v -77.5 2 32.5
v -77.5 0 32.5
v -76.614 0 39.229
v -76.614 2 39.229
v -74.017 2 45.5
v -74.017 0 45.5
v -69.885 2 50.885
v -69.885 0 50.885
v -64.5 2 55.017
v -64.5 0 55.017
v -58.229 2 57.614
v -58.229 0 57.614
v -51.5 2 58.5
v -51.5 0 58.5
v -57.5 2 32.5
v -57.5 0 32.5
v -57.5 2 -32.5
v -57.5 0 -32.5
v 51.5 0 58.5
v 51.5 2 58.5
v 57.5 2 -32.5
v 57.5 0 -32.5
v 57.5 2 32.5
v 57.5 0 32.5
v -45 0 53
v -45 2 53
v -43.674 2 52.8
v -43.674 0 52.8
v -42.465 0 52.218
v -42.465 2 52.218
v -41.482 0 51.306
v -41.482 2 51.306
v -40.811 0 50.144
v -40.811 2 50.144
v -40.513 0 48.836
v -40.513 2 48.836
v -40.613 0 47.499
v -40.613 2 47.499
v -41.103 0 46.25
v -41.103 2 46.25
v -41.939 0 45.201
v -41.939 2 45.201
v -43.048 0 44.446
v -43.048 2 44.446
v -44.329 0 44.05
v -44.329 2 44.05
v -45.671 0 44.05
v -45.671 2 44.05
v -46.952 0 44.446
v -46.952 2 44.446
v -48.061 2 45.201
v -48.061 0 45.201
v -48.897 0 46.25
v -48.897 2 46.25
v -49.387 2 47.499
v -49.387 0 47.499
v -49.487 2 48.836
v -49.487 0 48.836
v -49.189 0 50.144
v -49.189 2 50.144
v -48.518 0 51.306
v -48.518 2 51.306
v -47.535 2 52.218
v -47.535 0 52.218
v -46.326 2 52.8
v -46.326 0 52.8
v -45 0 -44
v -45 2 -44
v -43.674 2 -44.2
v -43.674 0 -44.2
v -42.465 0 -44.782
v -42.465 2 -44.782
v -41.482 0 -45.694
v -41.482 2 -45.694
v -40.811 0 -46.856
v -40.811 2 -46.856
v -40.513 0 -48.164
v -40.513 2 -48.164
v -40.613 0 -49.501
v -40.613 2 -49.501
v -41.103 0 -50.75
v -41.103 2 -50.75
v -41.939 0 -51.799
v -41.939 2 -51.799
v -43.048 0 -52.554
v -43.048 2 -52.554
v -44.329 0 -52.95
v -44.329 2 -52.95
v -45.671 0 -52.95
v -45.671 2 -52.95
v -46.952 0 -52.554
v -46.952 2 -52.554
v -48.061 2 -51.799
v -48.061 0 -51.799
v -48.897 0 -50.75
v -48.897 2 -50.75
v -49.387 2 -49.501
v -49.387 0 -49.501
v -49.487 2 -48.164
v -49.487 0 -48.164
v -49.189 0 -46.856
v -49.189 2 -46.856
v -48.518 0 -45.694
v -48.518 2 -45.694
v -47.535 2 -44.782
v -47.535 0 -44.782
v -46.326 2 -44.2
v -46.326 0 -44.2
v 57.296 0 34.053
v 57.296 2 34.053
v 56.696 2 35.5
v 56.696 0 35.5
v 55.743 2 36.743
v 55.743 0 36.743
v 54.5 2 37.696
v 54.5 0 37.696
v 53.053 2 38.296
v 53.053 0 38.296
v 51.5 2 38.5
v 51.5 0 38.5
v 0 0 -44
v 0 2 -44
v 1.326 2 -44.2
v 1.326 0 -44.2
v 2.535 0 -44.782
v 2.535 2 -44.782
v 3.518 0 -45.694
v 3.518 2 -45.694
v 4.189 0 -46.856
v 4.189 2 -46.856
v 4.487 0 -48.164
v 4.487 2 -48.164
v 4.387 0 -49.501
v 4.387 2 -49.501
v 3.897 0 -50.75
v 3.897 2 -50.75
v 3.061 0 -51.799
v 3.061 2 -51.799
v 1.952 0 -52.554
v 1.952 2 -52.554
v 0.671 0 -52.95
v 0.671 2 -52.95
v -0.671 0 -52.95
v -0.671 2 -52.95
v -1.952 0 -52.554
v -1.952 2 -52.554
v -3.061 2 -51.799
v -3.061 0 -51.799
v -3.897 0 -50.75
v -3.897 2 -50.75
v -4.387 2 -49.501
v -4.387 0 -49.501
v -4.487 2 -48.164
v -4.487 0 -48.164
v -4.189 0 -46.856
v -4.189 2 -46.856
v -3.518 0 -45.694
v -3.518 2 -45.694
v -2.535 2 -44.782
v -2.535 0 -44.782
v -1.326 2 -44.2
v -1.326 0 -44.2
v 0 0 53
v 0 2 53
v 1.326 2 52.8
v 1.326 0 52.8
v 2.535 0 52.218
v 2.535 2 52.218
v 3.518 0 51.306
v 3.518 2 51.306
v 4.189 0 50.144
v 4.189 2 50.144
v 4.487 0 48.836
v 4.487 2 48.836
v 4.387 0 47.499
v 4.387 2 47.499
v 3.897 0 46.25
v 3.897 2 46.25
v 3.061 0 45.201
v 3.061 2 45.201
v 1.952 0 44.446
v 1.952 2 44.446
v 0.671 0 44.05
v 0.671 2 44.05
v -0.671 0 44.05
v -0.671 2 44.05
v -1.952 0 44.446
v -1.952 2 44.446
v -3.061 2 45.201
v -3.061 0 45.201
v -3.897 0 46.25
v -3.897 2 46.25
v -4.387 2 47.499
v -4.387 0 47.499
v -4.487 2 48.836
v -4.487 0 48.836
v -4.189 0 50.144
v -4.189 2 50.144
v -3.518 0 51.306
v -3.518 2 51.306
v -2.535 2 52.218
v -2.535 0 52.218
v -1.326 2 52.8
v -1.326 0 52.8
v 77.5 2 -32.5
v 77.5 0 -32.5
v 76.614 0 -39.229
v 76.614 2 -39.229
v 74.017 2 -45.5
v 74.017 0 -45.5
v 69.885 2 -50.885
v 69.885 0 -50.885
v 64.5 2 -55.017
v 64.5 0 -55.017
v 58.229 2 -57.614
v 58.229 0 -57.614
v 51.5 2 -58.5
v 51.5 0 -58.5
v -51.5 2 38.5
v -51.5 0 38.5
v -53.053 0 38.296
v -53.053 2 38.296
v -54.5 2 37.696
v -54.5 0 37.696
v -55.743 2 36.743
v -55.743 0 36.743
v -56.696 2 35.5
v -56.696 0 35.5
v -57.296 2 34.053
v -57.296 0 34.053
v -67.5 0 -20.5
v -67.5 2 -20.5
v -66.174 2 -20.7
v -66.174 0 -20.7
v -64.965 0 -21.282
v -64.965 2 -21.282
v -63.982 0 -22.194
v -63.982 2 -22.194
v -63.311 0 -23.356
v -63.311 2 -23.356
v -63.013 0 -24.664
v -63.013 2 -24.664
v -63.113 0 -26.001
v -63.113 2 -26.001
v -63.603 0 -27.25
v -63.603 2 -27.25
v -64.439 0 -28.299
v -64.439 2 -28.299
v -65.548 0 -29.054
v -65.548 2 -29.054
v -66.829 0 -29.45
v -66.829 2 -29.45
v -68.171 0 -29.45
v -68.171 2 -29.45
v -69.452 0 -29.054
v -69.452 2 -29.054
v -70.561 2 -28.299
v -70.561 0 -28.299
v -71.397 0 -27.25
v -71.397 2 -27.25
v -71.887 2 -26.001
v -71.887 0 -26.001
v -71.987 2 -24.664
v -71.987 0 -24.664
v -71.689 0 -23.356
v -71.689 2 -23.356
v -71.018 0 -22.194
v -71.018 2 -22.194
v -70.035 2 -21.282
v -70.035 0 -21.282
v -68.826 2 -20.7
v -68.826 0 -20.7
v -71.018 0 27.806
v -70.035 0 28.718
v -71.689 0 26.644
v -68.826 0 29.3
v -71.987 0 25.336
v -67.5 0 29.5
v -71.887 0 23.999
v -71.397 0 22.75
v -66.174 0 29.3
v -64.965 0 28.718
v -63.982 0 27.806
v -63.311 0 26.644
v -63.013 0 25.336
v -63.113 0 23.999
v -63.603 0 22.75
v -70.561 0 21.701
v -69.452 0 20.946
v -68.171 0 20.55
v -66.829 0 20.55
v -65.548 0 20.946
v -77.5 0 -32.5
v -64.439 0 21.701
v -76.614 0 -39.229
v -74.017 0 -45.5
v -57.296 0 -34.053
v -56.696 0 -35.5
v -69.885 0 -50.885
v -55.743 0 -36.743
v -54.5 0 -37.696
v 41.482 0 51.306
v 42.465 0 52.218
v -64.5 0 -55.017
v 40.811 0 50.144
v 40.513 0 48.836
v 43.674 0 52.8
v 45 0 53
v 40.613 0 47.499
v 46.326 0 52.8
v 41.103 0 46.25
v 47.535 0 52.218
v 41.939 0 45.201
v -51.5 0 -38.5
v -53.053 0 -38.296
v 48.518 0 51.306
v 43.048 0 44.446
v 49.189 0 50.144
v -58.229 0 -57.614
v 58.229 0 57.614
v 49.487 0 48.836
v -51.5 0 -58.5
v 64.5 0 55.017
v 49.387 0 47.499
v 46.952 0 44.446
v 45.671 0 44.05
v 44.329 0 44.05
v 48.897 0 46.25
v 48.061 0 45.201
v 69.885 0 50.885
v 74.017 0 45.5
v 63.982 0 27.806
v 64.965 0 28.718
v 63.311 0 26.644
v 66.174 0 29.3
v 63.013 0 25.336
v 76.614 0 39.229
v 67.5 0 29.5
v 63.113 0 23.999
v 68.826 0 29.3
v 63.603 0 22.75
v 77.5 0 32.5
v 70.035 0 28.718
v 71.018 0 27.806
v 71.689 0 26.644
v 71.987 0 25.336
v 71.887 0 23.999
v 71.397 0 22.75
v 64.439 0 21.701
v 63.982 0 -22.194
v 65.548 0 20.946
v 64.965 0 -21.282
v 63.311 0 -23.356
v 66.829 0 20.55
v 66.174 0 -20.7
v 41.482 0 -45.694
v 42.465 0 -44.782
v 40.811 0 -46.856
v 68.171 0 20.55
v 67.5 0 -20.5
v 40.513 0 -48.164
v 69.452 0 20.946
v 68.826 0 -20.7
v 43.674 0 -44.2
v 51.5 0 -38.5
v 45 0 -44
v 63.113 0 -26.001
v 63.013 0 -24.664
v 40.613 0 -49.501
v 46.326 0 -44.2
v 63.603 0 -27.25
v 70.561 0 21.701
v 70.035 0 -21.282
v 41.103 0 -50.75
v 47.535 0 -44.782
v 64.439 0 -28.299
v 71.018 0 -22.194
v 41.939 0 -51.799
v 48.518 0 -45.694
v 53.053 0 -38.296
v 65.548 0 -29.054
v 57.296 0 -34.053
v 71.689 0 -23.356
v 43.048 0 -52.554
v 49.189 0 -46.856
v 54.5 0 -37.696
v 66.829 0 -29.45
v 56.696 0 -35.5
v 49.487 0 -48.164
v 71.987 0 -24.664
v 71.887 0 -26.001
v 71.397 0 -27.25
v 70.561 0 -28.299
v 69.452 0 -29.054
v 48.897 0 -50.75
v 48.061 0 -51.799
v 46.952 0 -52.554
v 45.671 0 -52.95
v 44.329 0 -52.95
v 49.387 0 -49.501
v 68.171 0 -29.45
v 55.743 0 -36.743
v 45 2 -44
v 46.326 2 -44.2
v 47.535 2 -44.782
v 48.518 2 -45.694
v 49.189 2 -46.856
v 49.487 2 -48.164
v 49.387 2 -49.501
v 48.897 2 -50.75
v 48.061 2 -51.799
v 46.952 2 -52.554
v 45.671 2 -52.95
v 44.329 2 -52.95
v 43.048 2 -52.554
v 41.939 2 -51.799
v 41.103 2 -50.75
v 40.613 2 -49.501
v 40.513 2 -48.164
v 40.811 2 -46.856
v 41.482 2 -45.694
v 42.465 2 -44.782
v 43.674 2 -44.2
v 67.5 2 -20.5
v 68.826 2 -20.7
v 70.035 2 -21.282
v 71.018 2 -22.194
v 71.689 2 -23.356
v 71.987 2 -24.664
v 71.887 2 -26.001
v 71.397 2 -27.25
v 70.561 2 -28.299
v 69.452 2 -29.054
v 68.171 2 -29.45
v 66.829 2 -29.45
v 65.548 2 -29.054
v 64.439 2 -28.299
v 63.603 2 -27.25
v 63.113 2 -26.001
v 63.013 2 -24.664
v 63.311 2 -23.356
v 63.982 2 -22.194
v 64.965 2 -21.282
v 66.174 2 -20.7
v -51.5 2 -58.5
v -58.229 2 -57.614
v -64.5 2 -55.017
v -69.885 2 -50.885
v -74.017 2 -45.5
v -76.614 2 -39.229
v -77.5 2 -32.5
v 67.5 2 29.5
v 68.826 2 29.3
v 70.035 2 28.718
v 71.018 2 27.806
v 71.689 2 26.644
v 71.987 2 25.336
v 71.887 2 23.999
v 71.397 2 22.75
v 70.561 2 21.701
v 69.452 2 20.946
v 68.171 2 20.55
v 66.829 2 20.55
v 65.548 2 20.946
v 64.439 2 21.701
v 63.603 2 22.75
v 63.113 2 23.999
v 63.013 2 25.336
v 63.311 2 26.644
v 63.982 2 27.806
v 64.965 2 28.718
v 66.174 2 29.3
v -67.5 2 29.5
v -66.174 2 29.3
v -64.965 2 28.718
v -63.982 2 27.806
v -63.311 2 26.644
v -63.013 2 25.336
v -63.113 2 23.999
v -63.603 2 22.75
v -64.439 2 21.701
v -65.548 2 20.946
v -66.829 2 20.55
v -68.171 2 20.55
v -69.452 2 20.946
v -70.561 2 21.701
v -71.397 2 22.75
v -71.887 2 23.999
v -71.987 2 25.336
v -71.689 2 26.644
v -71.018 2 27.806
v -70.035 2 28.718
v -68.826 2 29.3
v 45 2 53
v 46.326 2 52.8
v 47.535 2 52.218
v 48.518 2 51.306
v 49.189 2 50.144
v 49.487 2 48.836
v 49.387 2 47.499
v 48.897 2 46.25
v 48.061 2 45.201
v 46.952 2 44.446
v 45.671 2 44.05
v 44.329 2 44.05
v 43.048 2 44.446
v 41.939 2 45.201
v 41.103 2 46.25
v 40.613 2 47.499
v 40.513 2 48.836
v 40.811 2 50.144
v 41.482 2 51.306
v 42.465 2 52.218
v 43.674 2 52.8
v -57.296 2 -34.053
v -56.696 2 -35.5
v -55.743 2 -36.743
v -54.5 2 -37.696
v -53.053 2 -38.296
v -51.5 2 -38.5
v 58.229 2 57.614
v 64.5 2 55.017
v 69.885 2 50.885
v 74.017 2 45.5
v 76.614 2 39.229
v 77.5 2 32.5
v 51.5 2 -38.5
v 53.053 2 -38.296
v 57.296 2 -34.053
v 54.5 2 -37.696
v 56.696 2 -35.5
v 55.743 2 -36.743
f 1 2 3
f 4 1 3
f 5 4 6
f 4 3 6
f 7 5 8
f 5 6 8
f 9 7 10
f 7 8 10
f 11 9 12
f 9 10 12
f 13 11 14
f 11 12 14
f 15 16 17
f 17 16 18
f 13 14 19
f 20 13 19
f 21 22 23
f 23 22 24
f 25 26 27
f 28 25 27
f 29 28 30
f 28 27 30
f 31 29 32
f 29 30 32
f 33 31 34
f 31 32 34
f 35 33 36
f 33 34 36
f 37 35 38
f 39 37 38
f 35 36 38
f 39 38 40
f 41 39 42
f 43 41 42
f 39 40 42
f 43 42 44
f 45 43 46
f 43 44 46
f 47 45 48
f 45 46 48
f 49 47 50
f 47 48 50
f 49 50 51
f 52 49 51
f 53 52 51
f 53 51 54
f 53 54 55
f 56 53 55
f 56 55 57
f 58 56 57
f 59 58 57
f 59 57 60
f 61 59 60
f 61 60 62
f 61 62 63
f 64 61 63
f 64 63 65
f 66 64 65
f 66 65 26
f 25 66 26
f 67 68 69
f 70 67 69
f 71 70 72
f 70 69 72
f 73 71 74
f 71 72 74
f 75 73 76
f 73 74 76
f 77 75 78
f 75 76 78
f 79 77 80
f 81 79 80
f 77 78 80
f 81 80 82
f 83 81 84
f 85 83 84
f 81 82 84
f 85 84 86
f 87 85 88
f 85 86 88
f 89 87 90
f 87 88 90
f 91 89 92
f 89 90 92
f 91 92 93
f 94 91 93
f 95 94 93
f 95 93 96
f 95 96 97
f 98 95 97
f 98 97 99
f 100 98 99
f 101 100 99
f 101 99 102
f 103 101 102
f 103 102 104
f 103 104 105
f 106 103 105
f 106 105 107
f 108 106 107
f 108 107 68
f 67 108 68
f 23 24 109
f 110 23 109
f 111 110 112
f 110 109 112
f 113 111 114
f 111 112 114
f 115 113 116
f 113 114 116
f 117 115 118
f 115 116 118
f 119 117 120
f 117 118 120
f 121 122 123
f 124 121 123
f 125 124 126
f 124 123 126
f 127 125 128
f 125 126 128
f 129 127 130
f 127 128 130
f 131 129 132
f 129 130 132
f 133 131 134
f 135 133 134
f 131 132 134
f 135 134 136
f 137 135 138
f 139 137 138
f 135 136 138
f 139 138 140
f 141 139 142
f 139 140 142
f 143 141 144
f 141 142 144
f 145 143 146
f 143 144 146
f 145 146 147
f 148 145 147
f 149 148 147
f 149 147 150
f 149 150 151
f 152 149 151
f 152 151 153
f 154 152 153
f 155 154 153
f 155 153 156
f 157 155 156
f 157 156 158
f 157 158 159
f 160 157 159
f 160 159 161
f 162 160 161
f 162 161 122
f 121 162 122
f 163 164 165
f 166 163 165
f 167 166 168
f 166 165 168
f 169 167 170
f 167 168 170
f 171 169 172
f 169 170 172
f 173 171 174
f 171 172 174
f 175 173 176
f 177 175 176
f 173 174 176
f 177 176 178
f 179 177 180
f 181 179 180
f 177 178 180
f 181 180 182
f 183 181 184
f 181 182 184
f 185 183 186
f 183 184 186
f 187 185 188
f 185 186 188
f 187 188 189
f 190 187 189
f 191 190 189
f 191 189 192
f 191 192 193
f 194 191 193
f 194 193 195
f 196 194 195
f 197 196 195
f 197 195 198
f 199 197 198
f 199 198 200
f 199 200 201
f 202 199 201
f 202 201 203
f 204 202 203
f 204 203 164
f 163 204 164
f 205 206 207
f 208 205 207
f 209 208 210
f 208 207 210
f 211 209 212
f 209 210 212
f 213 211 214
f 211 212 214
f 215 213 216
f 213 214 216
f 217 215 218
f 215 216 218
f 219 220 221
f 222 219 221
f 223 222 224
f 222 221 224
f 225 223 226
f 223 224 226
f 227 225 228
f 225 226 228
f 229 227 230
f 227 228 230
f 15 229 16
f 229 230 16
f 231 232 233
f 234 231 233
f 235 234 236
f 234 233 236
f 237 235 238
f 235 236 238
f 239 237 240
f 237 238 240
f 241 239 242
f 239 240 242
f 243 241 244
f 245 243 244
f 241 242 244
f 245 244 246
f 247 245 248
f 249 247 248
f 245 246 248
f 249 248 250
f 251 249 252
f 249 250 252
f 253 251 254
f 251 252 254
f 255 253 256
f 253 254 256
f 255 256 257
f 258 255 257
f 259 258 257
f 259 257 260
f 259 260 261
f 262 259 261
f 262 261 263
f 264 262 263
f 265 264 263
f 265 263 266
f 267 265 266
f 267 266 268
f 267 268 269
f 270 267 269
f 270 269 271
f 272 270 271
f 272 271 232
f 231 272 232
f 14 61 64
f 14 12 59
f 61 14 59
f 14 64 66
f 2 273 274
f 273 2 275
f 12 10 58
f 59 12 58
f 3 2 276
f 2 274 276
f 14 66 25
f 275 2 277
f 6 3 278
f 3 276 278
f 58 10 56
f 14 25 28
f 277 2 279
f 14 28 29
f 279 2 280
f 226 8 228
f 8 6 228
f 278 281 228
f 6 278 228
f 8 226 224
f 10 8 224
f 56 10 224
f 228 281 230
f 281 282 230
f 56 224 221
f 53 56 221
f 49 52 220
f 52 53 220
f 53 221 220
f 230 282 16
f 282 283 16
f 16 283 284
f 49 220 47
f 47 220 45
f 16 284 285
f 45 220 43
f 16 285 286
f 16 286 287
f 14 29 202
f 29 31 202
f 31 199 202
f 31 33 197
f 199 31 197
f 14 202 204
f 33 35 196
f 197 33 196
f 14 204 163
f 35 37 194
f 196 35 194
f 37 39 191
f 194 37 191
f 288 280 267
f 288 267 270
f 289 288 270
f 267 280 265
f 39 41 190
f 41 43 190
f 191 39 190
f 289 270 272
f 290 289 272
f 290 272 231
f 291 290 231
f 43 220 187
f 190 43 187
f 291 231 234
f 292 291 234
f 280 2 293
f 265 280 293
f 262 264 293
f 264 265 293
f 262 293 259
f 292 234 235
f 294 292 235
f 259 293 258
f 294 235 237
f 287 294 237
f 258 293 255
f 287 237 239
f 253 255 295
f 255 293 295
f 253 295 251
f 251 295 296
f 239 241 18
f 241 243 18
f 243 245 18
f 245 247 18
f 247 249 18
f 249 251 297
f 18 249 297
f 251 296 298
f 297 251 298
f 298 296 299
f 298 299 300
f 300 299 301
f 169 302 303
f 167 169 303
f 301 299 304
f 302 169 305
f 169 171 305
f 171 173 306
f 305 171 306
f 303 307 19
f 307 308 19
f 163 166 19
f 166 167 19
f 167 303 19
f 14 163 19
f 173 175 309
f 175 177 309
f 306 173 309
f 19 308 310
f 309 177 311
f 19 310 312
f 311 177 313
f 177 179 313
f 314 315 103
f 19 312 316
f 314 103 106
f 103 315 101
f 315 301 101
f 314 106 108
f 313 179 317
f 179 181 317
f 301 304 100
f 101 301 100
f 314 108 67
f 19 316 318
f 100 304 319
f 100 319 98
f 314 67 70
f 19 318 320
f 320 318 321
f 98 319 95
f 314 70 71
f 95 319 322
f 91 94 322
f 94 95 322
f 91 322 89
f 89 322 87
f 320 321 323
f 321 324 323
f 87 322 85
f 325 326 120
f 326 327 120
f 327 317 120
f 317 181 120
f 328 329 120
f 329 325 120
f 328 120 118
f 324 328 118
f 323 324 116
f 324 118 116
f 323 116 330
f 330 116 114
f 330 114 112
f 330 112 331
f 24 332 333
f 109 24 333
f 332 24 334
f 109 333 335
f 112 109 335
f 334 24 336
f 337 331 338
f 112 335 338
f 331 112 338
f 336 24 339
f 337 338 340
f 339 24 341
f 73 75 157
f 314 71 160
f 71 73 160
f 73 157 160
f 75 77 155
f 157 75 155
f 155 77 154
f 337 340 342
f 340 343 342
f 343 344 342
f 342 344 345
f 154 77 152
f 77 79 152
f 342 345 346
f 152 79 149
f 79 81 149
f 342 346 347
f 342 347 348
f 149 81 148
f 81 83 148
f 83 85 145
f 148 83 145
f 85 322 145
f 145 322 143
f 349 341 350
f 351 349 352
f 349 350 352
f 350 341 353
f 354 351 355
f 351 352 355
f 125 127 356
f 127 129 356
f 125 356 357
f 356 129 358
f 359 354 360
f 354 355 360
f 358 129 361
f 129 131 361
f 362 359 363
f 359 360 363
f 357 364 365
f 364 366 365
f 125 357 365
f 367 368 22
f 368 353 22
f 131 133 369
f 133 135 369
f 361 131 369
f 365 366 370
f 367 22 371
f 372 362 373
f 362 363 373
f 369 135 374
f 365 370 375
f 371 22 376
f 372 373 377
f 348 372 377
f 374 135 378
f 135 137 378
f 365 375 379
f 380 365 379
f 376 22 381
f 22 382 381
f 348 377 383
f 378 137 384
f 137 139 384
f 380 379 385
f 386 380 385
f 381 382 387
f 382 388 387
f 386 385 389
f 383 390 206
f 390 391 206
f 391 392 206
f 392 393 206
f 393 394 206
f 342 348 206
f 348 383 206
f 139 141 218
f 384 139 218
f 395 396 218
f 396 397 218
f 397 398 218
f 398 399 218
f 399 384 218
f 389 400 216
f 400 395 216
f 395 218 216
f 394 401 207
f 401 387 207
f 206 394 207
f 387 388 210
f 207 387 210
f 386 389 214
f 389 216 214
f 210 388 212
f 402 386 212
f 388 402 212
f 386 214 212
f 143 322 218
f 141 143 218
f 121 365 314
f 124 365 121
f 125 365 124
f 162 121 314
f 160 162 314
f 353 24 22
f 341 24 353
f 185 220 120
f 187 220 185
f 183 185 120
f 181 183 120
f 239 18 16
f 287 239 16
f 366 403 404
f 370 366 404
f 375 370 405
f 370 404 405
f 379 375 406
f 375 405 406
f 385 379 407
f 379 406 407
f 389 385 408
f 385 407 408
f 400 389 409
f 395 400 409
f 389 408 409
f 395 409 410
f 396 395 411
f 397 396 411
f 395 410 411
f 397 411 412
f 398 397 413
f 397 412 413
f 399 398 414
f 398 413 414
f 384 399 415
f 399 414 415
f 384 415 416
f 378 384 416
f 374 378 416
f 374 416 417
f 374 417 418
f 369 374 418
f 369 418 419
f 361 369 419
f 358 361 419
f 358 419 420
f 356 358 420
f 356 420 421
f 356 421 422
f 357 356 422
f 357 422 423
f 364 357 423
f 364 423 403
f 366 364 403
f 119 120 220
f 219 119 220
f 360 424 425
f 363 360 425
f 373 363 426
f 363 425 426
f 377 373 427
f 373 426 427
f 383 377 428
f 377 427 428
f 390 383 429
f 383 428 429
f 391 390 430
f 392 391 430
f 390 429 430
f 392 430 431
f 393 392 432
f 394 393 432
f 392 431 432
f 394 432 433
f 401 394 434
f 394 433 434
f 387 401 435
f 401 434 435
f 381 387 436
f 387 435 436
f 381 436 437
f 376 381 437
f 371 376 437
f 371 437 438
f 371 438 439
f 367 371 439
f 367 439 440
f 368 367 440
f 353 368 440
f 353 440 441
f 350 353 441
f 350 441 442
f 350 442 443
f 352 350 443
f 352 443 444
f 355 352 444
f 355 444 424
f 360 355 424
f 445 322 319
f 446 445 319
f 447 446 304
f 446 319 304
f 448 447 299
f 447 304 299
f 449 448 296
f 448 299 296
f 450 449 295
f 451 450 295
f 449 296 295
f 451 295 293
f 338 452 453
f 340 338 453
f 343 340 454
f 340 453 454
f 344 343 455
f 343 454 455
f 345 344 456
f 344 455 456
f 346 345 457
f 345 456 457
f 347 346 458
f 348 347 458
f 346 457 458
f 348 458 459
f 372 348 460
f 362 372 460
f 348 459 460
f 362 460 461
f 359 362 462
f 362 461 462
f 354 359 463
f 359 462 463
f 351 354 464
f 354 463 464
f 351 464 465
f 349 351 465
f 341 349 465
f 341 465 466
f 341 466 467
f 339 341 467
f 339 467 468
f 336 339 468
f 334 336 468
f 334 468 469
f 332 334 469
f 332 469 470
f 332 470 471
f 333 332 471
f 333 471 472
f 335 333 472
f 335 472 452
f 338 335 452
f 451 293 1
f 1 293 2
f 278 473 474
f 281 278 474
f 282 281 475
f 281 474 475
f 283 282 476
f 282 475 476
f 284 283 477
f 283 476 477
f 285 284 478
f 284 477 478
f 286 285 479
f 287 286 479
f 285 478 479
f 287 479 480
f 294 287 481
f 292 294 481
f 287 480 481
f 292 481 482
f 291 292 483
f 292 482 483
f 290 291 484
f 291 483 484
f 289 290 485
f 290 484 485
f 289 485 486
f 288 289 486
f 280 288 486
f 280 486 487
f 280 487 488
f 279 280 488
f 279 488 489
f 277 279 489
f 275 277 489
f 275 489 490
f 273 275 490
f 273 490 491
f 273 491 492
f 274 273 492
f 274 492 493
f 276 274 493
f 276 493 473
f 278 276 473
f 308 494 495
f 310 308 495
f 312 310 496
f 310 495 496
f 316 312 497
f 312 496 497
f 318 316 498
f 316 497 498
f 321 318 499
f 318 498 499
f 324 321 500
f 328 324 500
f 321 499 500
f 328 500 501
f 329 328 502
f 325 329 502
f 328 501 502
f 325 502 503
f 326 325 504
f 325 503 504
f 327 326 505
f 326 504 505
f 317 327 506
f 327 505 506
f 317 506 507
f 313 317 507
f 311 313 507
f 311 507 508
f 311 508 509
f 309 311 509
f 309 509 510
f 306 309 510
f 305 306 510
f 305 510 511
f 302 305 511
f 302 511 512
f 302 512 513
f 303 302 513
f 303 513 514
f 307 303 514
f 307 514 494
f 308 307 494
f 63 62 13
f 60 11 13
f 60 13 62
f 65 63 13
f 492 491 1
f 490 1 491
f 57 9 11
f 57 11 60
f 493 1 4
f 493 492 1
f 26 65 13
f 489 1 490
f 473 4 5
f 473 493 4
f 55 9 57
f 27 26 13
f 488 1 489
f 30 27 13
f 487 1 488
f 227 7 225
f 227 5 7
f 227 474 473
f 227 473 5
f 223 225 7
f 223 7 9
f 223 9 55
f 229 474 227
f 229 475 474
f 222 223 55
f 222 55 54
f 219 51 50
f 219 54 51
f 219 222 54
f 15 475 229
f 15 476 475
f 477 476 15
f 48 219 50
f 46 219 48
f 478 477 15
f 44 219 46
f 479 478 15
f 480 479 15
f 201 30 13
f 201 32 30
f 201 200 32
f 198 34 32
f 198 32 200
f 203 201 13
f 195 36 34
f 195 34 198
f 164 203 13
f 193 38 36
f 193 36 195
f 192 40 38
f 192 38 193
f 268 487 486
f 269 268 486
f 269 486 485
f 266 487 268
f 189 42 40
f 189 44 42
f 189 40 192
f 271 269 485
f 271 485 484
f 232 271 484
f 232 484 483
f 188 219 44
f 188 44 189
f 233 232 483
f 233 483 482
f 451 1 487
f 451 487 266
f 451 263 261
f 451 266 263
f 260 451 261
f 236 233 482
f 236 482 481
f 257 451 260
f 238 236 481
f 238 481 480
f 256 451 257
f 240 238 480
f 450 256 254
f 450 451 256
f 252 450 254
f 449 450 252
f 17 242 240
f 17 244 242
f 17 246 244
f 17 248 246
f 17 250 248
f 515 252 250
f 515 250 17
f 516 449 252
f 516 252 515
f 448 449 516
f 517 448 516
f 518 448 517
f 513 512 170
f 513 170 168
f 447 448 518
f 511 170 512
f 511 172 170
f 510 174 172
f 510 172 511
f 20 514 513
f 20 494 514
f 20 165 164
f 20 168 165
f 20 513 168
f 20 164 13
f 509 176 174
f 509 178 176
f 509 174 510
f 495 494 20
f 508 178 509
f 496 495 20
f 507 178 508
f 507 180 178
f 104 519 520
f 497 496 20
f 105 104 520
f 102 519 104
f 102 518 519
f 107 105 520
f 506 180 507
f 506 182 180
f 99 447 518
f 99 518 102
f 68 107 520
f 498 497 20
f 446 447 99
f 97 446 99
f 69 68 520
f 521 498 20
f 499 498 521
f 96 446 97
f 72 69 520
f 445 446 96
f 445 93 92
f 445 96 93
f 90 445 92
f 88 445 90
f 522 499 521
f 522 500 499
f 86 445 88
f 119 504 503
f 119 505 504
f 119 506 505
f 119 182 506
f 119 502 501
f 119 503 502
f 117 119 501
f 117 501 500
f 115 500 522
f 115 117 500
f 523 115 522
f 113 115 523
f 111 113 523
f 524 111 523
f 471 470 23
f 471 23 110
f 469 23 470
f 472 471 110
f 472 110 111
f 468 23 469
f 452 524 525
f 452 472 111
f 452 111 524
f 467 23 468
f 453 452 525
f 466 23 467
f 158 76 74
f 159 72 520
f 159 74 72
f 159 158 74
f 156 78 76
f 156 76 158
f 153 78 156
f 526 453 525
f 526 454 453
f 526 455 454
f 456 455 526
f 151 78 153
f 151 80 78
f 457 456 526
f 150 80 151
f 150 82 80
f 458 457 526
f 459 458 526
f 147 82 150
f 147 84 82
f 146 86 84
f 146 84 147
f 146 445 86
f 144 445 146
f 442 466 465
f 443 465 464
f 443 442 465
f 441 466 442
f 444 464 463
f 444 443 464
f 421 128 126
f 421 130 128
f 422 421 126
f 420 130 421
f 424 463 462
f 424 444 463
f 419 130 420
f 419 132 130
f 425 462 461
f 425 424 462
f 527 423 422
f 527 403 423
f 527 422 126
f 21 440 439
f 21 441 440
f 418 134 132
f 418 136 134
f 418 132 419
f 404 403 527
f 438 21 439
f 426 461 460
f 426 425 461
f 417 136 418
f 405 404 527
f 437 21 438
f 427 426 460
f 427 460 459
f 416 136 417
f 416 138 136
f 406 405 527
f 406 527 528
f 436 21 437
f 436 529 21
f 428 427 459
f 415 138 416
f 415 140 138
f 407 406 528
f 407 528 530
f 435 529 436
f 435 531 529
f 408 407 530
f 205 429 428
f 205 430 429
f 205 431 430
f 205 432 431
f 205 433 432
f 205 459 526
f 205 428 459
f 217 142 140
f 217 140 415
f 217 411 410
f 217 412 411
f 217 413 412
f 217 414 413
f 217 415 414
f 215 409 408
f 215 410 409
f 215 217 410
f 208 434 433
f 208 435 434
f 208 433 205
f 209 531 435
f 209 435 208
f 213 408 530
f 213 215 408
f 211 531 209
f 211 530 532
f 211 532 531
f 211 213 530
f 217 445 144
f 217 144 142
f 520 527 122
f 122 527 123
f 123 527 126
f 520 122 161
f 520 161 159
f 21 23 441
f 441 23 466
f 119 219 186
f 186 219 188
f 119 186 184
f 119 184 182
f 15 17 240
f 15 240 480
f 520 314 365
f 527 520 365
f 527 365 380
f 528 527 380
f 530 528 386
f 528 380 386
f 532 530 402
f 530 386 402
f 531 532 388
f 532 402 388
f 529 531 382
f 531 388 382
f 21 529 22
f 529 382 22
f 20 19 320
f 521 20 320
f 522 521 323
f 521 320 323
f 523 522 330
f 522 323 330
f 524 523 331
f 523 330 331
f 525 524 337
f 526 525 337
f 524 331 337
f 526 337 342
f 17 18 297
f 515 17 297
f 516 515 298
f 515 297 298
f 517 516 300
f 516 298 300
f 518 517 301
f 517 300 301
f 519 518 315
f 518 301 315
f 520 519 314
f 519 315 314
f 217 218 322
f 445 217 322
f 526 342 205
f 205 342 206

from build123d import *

# Parameters (mm, degrees)
EXTRUDE_1_DEPTH     = 2
SKETCH_4_R          = 4.5
CUT_EXTRUDE_1_DEPTH = 98.121058479


with BuildPart() as part:
    # Эскиз2 → Бобышка-Вытянуть1 (new body)
    with BuildSketch(Plane(origin=(0, 0, 0), x_dir=(1, 0, 0), z_dir=(0, 1, 0))):
        with BuildLine():
            Line((-51.5, -58.5), (51.5, -58.5))
            ThreePointArc((51.5, -58.5), (69.884776311, -50.884776311), (77.5, -32.5))
            Line((77.5, -32.5), (77.5, 32.5))
            ThreePointArc((77.5, 32.5), (69.884776311, 50.884776311), (51.5, 58.5))
            Line((51.5, 58.5), (-51.5, 58.5))
            ThreePointArc((-51.5, 58.5), (-69.884776311, 50.884776311), (-77.5, 32.5))
            Line((-77.5, 32.5), (-77.5, -32.5))
            ThreePointArc((-77.5, -32.5), (-69.884776311, -50.884776311), (-51.5, -58.5))
        make_face()
        with BuildLine():
            Line((-51.5, 38.5), (51.5, 38.5))
            ThreePointArc((51.5, 38.5), (55.742640687, 36.742640687), (57.5, 32.5))
            Line((57.5, 32.5), (57.5, -32.5))
            ThreePointArc((57.5, -32.5), (55.742640687, -36.742640687), (51.5, -38.5))
            Line((51.5, -38.5), (-51.5, -38.5))
            ThreePointArc((-51.5, -38.5), (-55.742640687, -36.742640687), (-57.5, -32.5))
            Line((-57.5, -32.5), (-57.5, 32.5))
            ThreePointArc((-57.5, 32.5), (-55.742640687, 36.742640687), (-51.5, 38.5))
        make_face(mode=Mode.SUBTRACT)
    extrude(amount=EXTRUDE_1_DEPTH)

    # Эскиз4 → Вырез-Вытянуть1 (cut, through all)
    with BuildSketch(Plane(origin=(0, 2, 0), x_dir=(1, 0, 0), z_dir=(0, 1, 0))):
        with Locations(Location((-45, -48.5, 0), (0, 0, 270))):
            Circle(SKETCH_4_R)
    cut_extrude_1 = extrude(amount=-CUT_EXTRUDE_1_DEPTH, mode=Mode.SUBTRACT)

    # Эскиз-Массив1: Вырез-Вытянуть1 at 9 more places
    with Locations((45, 0, 0), (90, 0, 0), (112.5, 0, -23.5), (112.5, 0, -73.5), (-22.5, 0, -23.5), (-22.5, 0, -73.5), (90, 0, -97), (45, 0, -97), (0, 0, -97)):
        add(cut_extrude_1, mode=Mode.SUBTRACT)


solid = part.part
